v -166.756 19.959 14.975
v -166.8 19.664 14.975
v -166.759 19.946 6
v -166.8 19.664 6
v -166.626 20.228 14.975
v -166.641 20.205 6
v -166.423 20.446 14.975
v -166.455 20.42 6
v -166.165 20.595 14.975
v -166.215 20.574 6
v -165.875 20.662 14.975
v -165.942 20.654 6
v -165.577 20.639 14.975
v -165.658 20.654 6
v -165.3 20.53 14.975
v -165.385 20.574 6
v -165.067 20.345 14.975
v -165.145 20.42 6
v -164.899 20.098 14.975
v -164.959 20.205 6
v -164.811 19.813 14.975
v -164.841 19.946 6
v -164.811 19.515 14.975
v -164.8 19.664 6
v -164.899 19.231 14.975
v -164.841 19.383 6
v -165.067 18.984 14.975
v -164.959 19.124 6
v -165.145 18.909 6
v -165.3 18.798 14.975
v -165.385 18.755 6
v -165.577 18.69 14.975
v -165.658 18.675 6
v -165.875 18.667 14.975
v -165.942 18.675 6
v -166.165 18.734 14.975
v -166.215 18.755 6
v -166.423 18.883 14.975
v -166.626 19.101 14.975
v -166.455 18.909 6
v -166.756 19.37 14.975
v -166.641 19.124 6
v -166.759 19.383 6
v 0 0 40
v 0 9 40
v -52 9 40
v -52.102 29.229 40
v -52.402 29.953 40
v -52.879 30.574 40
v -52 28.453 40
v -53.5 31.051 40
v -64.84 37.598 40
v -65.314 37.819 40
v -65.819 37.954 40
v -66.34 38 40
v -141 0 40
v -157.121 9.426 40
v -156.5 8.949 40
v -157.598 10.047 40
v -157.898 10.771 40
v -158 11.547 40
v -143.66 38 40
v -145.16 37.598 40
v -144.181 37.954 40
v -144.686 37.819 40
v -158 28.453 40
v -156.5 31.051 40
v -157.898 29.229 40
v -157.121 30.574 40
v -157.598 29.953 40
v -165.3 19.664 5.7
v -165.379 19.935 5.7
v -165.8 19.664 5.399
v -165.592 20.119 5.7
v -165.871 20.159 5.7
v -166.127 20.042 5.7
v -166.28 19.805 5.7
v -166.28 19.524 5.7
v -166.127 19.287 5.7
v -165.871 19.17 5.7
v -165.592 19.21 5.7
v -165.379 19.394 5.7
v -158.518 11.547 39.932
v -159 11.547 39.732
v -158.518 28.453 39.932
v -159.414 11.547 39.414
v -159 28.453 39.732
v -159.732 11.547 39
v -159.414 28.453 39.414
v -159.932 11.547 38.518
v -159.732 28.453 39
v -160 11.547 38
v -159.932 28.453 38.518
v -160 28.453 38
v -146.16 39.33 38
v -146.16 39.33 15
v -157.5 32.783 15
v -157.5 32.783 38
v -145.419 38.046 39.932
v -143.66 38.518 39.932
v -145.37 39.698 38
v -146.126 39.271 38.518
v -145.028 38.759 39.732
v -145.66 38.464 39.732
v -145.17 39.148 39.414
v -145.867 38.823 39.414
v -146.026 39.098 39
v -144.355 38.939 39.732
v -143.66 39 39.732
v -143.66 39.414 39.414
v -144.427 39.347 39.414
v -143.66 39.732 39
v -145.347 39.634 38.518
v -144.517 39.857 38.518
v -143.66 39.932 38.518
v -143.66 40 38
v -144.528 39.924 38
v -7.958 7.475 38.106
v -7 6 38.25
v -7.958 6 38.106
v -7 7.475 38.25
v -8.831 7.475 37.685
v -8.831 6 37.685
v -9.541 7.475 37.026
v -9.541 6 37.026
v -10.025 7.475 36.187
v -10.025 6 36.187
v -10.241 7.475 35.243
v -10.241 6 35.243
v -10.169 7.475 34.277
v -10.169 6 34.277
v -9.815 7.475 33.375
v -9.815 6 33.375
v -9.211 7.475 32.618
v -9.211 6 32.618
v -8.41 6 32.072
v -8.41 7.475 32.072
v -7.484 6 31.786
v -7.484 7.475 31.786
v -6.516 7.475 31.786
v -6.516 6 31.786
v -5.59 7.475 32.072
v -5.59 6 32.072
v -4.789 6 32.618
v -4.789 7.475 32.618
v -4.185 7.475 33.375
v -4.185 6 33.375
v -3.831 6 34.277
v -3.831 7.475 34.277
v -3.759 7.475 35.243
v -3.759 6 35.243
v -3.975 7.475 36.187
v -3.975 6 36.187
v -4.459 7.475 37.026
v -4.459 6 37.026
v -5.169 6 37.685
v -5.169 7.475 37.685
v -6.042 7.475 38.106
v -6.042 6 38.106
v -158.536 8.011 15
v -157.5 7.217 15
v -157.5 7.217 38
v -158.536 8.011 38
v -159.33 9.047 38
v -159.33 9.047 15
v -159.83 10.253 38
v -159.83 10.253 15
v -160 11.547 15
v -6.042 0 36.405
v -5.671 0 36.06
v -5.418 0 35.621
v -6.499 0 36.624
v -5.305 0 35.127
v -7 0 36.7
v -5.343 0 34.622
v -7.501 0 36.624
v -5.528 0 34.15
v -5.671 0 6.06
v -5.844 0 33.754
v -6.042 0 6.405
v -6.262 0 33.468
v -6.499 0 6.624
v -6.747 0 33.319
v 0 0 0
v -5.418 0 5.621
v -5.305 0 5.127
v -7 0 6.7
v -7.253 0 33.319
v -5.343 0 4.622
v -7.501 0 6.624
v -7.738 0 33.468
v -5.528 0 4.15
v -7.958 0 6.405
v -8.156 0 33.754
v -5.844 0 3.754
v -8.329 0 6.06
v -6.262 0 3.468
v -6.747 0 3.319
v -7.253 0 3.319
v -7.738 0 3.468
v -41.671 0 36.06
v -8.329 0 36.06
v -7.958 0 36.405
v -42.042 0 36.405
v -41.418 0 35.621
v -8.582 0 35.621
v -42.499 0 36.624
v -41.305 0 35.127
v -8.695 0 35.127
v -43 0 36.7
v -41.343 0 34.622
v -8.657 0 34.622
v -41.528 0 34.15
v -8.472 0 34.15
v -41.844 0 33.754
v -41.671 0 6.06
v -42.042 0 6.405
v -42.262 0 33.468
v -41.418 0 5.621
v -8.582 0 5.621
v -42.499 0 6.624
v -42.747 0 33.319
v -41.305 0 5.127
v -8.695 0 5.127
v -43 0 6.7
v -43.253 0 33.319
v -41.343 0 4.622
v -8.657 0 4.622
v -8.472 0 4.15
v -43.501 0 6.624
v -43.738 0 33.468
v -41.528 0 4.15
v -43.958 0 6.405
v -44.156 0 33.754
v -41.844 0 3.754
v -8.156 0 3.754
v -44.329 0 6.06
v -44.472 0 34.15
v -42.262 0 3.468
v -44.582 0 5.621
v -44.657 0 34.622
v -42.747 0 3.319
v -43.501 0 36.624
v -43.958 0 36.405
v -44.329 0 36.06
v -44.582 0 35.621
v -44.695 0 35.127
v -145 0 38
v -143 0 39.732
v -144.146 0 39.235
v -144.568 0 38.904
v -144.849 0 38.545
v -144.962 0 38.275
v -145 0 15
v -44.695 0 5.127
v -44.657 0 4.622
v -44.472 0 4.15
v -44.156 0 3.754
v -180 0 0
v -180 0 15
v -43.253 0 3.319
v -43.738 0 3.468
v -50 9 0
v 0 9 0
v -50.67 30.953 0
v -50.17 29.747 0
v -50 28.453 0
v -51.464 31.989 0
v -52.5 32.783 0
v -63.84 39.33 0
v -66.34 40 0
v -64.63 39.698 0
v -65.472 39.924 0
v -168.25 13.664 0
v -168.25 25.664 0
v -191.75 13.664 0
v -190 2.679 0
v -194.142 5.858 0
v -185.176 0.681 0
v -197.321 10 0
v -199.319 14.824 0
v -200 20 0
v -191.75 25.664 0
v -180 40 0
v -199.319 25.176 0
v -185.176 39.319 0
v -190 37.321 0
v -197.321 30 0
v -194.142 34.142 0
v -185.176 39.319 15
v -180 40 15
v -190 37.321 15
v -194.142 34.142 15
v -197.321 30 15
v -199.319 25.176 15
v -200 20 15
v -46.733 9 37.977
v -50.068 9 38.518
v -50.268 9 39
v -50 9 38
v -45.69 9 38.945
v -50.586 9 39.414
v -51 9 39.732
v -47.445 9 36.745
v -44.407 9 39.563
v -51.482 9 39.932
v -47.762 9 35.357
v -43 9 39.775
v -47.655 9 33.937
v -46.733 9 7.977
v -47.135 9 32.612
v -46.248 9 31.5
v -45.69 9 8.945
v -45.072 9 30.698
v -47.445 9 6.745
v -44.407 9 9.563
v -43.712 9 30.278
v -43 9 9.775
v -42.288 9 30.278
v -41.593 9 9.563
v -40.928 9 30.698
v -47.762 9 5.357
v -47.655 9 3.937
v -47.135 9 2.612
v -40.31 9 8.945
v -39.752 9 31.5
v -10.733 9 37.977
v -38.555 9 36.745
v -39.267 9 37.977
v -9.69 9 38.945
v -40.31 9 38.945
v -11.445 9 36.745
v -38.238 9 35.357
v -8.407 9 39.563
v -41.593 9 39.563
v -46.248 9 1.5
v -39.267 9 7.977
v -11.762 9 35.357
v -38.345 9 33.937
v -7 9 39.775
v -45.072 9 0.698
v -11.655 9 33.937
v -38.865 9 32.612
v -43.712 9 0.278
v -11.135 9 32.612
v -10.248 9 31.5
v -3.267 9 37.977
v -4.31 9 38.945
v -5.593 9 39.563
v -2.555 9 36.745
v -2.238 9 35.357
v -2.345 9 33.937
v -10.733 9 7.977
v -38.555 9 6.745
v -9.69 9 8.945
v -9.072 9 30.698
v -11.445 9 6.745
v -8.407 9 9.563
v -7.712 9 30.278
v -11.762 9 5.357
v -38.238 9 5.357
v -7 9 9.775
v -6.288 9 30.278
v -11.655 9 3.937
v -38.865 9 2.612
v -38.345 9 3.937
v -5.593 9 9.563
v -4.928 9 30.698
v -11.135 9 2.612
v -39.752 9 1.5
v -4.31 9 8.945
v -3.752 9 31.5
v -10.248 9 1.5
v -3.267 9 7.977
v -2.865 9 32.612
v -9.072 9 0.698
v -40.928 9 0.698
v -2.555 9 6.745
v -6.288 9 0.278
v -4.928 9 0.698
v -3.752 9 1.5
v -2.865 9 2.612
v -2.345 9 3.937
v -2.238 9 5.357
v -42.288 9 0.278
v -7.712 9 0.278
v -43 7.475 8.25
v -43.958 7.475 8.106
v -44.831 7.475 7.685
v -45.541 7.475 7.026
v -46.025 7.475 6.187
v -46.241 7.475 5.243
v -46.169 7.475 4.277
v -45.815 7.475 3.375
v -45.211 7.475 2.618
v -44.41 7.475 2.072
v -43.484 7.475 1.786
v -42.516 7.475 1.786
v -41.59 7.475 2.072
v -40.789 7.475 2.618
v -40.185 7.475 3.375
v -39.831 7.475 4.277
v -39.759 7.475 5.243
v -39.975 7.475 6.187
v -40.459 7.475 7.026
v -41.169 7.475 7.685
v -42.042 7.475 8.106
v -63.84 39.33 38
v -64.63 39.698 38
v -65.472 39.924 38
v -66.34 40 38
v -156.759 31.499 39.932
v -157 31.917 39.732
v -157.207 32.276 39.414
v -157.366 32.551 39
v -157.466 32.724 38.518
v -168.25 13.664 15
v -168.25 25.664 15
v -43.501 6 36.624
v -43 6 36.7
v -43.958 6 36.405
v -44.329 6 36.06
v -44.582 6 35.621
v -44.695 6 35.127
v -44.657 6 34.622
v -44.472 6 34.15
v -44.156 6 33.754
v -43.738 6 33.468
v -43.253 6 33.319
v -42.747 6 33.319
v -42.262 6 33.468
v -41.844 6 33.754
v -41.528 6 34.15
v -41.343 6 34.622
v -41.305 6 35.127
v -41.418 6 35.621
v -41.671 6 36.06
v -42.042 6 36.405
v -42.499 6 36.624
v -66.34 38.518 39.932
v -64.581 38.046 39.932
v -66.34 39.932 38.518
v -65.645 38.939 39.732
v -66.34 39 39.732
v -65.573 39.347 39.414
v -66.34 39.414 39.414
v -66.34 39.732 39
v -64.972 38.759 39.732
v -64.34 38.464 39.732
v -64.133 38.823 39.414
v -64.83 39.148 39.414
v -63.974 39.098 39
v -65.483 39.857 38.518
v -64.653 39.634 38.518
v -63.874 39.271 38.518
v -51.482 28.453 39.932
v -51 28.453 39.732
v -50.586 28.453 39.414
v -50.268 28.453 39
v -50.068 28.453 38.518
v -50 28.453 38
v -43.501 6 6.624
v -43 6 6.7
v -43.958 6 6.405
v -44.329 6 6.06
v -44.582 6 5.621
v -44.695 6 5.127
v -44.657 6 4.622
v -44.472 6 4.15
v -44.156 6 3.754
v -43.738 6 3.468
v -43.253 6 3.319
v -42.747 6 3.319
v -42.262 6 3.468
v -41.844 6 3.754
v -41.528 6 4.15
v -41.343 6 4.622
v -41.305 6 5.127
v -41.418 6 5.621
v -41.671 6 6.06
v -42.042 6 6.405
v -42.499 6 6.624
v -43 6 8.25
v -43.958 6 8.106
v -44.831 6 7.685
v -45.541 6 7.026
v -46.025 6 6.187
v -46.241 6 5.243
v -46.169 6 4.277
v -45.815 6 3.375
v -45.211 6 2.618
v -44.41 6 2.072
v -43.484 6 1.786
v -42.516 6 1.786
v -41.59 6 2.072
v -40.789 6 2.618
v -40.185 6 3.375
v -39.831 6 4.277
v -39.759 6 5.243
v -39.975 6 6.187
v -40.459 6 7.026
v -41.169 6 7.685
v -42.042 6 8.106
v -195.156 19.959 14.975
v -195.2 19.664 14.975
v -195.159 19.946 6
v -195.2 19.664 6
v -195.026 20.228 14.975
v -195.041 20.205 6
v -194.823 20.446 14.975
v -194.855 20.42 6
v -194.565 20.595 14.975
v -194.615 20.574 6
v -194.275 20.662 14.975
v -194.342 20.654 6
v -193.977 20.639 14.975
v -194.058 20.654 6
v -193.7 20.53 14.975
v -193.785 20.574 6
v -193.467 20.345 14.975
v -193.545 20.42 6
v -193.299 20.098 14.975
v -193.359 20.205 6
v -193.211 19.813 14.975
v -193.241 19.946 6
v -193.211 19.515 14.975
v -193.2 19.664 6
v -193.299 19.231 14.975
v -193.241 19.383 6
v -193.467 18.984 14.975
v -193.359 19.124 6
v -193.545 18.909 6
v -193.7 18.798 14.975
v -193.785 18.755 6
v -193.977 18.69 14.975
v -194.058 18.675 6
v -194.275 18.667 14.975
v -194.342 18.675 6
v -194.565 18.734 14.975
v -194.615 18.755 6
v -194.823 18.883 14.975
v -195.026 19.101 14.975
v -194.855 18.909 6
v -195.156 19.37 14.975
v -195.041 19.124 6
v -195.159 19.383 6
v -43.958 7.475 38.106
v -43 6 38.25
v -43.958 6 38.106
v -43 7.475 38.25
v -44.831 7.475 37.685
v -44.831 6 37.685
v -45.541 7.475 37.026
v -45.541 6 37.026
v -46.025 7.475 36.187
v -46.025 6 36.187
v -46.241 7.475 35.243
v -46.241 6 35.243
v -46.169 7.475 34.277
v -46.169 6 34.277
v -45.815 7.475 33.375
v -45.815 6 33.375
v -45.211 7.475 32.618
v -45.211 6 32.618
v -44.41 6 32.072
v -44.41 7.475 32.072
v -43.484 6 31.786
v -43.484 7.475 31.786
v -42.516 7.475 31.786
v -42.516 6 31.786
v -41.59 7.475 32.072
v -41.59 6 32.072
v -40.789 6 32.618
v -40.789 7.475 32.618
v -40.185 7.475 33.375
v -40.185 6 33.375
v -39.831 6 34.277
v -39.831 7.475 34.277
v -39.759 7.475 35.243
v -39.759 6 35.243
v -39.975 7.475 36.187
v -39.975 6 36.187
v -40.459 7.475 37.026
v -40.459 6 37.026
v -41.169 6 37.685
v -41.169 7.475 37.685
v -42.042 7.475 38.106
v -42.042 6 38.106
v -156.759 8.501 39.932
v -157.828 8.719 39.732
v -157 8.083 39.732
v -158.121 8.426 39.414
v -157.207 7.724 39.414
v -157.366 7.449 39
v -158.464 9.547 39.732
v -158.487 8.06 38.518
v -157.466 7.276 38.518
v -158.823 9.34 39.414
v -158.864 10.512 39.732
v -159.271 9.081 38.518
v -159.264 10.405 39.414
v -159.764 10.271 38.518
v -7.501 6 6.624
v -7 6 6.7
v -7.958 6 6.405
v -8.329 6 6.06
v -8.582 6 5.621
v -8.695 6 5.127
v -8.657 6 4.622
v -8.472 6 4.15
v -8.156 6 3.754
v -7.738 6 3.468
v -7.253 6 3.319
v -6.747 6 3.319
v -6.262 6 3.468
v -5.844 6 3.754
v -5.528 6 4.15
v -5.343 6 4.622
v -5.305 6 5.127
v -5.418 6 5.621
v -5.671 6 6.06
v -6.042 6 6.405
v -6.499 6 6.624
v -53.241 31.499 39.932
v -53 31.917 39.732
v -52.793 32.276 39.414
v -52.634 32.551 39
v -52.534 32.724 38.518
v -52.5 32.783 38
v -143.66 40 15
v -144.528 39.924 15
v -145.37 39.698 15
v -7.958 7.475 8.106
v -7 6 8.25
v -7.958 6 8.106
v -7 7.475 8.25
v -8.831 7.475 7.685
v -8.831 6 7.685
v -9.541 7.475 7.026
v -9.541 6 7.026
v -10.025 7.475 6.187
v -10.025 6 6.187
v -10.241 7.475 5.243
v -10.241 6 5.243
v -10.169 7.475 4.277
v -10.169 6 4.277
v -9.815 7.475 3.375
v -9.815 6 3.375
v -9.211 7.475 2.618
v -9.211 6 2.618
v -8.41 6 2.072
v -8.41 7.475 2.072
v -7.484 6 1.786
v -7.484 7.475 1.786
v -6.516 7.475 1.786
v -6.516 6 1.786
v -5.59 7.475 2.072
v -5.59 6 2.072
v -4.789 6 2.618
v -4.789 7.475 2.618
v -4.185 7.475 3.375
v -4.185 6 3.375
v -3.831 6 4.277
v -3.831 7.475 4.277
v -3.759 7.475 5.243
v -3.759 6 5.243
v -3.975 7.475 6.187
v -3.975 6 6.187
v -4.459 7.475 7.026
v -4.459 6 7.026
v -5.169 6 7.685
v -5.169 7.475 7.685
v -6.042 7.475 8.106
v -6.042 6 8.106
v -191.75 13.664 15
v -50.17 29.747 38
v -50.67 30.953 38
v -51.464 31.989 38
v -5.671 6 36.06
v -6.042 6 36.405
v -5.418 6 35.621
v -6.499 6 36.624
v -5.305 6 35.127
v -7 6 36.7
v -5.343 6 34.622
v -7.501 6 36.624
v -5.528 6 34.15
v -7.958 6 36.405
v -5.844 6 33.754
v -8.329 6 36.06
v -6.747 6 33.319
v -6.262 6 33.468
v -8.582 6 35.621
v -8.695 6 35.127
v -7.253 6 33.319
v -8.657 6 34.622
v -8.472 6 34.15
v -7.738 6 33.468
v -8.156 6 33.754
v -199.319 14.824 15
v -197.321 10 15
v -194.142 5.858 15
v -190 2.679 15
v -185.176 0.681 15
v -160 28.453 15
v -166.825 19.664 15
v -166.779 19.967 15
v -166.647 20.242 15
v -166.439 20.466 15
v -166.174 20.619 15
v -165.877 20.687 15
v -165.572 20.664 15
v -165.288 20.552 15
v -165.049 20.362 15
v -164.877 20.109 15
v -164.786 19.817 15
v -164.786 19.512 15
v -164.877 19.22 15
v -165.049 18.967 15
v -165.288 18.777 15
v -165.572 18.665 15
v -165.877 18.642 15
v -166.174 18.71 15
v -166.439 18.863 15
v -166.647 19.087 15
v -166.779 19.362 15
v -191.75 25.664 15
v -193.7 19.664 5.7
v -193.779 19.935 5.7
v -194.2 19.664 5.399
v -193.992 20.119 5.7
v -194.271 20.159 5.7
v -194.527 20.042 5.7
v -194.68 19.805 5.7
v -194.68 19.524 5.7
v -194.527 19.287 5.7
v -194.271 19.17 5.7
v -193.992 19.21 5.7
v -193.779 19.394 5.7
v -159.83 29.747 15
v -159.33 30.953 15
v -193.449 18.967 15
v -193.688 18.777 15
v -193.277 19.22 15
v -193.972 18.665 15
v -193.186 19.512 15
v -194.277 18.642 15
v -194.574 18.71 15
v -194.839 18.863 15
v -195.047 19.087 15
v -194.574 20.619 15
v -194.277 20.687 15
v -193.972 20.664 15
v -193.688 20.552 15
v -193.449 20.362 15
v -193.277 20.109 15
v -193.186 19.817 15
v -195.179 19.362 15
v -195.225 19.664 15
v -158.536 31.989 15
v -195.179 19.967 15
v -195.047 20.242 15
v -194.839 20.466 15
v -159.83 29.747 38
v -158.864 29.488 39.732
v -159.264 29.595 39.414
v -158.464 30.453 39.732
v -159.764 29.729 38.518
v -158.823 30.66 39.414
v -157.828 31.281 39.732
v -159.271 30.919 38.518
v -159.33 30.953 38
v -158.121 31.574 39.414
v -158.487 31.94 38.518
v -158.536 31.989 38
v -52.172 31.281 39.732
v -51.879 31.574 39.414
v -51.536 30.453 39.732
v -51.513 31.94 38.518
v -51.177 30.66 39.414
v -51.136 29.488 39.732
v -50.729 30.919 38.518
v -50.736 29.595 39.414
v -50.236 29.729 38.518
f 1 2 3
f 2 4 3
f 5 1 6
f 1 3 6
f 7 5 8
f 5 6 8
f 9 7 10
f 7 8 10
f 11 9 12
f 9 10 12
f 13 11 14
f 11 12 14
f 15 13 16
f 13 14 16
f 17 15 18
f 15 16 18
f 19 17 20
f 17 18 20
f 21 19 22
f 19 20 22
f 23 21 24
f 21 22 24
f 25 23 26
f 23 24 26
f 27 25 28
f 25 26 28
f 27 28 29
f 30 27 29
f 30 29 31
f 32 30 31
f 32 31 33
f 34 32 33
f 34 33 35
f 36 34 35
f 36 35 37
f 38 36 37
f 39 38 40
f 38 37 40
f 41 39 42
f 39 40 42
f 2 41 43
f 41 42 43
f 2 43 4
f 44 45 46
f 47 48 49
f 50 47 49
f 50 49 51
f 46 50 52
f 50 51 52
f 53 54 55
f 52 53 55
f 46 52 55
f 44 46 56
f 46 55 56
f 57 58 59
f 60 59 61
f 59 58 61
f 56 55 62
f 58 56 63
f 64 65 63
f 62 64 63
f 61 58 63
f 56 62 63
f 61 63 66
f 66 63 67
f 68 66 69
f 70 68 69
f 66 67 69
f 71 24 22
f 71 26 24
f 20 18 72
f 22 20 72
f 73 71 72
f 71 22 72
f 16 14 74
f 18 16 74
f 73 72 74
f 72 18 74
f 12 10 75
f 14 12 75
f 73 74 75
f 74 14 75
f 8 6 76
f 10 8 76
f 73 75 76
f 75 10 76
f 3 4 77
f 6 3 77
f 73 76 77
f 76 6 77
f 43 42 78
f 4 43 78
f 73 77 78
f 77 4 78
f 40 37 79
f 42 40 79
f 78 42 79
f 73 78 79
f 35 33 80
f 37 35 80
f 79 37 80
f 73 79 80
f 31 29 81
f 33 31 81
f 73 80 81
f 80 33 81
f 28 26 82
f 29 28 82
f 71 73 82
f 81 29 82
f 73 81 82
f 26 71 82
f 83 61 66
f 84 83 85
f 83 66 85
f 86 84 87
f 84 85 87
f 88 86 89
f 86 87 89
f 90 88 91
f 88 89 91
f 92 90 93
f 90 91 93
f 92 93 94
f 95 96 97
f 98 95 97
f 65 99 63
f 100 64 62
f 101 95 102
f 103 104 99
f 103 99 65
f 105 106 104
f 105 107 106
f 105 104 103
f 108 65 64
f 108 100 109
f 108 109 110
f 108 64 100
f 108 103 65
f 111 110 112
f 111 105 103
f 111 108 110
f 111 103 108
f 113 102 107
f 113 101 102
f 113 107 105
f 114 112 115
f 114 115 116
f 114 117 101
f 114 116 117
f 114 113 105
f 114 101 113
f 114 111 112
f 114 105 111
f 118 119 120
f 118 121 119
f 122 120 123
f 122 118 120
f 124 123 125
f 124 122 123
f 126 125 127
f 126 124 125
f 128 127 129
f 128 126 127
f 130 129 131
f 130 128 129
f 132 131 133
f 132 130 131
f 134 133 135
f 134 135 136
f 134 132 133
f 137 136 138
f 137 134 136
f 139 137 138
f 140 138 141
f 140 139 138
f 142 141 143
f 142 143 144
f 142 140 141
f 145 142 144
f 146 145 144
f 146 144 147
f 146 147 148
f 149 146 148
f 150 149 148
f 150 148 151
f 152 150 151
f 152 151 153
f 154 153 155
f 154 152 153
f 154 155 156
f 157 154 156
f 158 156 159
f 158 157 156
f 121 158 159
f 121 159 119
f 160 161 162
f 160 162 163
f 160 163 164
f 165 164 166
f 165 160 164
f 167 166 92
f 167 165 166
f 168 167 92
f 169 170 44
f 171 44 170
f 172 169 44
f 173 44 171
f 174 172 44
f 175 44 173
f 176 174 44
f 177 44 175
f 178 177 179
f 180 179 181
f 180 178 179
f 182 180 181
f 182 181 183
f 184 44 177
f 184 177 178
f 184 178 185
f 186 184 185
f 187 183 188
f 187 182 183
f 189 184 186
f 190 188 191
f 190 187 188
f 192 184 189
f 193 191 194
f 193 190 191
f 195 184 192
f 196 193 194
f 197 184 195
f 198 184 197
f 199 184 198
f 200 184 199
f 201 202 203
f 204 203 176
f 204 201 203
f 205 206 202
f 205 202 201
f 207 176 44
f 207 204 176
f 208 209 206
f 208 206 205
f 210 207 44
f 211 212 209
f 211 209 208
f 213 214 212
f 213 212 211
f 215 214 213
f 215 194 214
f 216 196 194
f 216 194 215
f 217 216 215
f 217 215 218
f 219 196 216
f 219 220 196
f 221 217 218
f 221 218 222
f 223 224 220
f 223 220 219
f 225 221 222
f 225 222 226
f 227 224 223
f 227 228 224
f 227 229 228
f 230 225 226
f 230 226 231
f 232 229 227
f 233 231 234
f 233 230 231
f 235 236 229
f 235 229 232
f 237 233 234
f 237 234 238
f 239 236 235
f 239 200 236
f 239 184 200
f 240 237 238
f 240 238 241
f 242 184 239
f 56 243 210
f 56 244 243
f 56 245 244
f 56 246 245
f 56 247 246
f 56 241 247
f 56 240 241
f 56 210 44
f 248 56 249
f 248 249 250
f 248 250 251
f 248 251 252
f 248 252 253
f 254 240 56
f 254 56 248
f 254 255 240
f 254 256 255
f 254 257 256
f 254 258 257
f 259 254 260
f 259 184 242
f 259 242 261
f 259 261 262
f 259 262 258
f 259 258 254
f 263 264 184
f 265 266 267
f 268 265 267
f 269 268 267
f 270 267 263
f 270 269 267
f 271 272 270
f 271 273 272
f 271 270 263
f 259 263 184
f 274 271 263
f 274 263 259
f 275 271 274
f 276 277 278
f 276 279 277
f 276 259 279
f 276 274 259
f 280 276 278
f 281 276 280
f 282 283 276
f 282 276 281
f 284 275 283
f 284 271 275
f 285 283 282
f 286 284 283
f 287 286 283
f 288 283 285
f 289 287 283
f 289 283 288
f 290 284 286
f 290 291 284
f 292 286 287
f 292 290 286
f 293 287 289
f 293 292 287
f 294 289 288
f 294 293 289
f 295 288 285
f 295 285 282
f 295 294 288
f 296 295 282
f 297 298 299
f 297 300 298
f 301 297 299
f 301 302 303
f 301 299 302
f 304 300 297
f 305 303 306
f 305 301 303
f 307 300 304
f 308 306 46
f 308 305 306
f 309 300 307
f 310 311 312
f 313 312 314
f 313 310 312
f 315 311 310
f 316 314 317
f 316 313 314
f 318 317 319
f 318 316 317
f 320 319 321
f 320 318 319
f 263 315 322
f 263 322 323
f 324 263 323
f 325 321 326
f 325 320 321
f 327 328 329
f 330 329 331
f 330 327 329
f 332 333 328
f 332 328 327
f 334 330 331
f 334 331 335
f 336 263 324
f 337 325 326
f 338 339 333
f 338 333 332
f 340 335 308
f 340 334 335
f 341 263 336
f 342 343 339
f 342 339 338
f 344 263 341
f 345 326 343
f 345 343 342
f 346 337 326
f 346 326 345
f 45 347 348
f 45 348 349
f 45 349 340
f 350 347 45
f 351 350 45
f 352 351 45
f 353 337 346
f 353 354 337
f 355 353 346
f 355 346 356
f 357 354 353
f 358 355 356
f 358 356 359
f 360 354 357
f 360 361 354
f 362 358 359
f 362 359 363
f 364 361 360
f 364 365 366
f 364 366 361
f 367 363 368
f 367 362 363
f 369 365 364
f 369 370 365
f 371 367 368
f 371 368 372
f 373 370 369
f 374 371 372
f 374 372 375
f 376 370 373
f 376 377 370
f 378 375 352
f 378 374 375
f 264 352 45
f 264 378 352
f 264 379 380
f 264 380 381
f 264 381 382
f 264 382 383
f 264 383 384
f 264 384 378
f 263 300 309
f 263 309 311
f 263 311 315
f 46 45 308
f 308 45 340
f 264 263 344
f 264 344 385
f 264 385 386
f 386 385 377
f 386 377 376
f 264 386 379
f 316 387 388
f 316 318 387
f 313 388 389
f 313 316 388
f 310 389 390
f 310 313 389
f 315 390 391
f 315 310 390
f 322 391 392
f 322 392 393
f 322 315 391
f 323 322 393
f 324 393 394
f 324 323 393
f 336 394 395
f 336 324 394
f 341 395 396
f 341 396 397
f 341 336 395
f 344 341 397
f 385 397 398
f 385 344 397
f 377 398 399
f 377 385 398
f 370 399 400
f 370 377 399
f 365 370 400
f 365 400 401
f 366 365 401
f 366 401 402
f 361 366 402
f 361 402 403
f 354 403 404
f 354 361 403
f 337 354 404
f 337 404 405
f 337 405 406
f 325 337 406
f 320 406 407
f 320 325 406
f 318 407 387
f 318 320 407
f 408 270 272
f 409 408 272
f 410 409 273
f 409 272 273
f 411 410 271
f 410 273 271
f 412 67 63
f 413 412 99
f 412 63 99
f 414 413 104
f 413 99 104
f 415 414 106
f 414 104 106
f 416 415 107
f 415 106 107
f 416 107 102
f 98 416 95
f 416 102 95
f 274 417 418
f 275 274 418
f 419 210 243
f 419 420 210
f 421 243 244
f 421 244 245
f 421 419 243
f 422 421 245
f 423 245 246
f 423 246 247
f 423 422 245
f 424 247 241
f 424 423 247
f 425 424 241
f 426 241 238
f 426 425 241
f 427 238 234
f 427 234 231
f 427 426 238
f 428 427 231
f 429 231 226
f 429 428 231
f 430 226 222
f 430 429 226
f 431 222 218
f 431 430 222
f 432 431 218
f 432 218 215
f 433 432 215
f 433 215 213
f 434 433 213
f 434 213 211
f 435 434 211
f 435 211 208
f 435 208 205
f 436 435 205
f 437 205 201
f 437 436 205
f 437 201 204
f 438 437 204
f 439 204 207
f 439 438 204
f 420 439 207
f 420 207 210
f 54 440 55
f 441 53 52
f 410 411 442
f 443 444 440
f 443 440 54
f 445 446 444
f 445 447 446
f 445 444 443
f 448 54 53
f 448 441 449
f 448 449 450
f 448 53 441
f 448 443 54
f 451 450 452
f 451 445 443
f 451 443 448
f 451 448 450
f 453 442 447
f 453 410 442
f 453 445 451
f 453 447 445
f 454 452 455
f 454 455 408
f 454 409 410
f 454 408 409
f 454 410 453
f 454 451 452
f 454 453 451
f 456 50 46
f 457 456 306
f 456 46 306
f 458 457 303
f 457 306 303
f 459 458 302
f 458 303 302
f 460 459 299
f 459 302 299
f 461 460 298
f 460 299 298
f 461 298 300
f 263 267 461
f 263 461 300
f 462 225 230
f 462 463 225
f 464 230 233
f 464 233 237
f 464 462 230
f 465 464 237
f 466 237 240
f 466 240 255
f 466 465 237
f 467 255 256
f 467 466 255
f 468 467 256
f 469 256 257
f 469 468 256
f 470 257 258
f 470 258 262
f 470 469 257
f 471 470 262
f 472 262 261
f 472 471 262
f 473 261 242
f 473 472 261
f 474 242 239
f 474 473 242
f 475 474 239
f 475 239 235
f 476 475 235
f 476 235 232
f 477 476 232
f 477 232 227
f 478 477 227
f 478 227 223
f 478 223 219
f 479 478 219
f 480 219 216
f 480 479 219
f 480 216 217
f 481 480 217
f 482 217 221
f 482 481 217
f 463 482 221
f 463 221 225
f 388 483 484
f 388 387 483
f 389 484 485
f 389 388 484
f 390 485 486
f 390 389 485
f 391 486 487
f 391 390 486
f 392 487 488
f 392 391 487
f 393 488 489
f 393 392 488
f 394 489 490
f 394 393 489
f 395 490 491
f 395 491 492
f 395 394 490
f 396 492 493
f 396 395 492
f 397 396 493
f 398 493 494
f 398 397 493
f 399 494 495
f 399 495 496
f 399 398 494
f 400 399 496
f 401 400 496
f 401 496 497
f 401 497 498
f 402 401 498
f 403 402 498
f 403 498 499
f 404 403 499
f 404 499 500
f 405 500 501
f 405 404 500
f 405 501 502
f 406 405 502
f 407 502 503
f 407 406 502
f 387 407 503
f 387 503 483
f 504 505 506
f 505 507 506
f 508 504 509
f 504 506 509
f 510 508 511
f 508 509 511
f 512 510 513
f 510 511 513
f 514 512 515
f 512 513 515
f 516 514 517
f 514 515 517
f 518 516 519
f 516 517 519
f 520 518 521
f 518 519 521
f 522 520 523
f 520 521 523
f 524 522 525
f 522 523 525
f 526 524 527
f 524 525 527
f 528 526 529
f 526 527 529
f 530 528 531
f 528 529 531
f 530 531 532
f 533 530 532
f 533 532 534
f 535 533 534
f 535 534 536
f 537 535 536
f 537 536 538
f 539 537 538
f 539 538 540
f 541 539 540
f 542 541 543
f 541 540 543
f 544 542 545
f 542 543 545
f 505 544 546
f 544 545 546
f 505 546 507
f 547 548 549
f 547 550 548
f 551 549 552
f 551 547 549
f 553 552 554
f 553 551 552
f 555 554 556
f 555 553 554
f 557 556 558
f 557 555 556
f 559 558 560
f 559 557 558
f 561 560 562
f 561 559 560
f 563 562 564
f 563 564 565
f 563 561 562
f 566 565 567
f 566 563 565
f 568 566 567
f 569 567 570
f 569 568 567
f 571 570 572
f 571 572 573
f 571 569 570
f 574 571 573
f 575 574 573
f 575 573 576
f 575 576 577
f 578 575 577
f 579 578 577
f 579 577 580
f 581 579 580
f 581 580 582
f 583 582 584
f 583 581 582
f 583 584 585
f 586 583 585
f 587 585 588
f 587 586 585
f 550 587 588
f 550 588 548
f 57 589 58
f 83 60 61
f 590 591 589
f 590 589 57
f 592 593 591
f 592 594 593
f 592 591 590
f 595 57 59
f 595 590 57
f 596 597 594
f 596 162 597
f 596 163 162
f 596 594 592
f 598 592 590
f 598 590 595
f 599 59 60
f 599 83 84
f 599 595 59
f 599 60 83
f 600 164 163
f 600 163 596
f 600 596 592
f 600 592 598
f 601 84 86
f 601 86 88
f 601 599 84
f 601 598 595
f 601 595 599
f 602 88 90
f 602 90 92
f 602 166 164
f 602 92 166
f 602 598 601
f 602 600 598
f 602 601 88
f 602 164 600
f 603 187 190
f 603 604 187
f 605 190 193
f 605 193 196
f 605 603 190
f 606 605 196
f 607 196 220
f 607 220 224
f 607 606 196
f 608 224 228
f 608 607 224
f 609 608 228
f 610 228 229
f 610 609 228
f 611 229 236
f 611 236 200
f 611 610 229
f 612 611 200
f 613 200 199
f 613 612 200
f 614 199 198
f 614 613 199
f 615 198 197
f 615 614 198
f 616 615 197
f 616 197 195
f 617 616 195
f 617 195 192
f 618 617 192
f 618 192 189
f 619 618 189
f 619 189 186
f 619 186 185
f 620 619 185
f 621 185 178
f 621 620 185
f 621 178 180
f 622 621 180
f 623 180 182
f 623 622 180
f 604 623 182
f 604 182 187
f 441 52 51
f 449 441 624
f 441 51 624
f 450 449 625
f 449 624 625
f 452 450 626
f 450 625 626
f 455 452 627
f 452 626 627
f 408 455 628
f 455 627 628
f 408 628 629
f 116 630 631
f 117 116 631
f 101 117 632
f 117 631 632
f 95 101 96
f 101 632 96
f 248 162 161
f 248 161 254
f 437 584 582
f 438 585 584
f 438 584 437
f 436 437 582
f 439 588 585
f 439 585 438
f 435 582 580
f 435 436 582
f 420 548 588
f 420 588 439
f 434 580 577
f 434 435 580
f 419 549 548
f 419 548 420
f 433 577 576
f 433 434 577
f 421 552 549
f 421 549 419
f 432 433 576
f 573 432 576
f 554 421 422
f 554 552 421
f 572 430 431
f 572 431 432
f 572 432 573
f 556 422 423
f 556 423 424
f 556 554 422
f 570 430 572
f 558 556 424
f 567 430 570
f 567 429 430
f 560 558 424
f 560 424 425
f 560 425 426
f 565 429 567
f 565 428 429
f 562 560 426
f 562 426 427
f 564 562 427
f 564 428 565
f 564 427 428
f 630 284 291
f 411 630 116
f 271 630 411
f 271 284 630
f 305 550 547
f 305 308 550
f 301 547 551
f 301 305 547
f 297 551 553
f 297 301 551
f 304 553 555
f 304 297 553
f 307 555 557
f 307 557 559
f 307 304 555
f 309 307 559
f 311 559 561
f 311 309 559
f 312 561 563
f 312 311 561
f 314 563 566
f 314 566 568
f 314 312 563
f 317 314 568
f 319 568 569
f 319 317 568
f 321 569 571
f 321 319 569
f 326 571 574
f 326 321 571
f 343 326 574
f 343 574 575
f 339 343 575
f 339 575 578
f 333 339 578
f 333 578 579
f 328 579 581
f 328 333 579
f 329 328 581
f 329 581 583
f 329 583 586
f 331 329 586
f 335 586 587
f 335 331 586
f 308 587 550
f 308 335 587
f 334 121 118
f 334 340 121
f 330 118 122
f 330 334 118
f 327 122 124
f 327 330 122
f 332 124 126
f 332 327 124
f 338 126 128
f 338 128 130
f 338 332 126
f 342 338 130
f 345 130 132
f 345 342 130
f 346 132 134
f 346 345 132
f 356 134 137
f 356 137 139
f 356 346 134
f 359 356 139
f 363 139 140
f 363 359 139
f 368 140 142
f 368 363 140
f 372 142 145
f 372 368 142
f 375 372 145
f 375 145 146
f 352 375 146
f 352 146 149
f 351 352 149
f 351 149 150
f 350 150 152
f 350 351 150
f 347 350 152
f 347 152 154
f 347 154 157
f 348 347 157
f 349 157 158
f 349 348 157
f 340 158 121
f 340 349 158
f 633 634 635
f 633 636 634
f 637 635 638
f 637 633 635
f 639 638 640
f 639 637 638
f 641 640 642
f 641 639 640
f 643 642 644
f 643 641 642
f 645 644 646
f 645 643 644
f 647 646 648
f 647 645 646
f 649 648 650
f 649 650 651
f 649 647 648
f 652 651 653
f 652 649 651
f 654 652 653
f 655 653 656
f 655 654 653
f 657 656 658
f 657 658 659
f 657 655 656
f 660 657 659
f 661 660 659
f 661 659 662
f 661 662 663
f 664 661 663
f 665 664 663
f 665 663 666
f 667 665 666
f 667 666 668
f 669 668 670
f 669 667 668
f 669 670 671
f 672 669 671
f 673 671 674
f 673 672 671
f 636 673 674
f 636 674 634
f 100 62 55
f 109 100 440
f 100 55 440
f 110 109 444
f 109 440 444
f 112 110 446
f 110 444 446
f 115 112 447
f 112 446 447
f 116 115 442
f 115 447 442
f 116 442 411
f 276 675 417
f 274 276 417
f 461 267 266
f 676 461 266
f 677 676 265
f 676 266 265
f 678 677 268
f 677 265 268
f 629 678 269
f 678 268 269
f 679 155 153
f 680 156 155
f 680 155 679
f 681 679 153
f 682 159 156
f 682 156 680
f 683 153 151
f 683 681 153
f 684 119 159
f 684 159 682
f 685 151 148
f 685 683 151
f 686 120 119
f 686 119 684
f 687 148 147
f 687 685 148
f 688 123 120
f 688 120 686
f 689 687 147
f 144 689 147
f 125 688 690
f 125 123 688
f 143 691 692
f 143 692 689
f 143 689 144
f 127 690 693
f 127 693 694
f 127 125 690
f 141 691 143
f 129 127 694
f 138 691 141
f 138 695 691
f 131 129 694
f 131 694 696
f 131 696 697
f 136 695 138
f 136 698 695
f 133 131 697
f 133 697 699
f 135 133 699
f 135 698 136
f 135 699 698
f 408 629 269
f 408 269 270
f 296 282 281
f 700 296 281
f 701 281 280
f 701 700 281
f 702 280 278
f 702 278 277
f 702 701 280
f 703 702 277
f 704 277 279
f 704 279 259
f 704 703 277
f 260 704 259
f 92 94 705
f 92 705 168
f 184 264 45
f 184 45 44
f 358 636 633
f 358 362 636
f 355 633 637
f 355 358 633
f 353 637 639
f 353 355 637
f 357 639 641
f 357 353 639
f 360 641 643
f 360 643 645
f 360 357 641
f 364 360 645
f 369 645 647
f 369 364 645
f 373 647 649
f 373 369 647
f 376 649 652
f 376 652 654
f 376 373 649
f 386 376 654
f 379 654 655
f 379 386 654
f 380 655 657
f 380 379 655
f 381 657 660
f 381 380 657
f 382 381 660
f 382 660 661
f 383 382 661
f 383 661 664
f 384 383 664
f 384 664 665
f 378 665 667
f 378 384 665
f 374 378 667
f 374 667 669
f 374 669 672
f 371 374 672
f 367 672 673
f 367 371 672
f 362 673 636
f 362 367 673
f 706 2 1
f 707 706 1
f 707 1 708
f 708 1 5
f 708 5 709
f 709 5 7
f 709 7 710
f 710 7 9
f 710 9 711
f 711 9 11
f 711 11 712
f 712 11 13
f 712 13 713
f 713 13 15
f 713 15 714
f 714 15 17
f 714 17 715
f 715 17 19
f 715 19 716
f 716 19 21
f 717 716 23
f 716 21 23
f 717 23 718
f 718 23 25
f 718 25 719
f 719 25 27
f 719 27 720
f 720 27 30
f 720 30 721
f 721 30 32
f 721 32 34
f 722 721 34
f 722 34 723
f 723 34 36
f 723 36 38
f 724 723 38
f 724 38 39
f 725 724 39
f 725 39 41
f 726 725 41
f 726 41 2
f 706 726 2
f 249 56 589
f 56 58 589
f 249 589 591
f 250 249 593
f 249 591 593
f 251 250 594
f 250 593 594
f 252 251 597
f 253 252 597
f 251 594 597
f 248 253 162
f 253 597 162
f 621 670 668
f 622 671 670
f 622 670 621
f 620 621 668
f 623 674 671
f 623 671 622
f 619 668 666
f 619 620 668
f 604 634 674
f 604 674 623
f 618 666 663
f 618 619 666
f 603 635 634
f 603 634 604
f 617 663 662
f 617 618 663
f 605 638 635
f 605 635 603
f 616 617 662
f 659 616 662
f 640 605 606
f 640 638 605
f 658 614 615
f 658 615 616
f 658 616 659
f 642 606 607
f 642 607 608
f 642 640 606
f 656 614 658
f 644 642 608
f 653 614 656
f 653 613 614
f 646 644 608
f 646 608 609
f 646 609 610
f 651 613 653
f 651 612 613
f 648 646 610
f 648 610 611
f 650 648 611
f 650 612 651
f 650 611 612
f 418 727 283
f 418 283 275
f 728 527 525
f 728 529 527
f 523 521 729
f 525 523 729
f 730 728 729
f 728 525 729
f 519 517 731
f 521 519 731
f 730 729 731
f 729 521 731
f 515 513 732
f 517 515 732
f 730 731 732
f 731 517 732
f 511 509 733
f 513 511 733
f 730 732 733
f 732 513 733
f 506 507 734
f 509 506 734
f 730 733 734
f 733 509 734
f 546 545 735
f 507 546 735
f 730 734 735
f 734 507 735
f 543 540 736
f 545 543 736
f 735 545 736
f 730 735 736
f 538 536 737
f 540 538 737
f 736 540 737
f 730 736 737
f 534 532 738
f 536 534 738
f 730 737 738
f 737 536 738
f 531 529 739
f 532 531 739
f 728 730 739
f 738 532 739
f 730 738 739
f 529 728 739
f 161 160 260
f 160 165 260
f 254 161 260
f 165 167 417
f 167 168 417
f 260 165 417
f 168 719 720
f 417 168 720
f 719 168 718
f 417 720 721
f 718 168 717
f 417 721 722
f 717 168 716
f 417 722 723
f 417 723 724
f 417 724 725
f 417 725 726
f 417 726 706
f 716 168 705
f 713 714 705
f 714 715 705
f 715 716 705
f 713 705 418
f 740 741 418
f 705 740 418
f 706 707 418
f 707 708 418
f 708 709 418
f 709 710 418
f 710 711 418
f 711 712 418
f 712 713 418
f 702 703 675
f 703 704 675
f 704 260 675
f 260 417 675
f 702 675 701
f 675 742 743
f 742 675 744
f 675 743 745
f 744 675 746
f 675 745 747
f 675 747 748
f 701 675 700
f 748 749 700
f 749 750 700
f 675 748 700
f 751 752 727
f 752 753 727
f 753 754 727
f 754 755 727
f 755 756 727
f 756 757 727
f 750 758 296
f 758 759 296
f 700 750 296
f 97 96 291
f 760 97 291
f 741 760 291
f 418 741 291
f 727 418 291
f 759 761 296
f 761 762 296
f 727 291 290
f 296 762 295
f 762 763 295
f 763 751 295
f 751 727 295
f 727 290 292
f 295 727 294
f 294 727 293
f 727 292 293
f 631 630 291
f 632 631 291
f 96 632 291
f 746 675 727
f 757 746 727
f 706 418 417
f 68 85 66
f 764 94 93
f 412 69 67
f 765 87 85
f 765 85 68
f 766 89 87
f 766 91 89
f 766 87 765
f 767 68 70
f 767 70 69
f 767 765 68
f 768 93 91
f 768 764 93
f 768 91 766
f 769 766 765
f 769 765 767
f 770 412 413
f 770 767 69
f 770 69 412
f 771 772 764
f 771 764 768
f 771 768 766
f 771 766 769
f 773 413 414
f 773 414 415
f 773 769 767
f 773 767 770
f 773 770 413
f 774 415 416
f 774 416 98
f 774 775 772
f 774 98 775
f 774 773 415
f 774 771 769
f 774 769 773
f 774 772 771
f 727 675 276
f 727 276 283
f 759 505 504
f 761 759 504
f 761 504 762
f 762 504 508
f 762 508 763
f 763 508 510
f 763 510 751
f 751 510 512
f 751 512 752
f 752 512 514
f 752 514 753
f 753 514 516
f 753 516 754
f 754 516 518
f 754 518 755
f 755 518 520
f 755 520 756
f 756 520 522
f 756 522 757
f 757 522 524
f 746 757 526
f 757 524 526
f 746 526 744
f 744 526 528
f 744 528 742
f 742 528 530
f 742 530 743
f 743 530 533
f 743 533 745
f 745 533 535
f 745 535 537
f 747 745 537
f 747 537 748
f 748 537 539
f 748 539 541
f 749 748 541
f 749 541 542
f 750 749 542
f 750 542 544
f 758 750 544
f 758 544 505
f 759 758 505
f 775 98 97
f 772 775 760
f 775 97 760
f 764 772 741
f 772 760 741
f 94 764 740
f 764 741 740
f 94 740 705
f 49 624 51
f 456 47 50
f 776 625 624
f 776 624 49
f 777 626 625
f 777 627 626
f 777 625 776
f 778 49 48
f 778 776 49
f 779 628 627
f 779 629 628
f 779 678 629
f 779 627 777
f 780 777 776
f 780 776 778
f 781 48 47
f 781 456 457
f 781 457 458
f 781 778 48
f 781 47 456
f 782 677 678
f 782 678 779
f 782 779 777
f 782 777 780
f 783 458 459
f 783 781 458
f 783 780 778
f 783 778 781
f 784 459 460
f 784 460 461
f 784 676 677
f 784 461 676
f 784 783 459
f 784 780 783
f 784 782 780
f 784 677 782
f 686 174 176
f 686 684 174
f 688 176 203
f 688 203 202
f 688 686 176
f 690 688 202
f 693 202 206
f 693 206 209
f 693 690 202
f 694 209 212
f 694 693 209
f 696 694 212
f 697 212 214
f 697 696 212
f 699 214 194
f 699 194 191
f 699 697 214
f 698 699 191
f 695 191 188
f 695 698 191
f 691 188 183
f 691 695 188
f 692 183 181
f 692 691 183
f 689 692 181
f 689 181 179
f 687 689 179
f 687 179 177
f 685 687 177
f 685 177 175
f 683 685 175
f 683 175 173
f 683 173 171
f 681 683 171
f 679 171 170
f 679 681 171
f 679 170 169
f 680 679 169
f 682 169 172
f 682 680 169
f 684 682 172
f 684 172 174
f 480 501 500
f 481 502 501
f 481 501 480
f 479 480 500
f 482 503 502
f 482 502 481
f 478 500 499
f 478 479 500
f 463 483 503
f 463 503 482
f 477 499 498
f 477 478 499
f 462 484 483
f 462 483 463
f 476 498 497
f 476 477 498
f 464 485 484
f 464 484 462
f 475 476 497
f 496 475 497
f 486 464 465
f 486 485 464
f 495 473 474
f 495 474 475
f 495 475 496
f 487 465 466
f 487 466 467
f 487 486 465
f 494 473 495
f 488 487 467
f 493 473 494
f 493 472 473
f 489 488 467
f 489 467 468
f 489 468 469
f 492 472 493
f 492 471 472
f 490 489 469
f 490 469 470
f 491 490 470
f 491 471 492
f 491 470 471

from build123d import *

# Parameters (mm, degrees)
BOSS_EXTRUDE1_DEPTH                        = 40
CUT_EXTRUDE2_DEPTH                         = 25
CUT_EXTRUDE4_DEPTH                         = 208.846096908
F_2_0MM_DOWEL_HOLE1_D                      = 2
F_2_0MM_DOWEL_HOLE1_DEPTH                  = 9
F_2_0MM_DOWEL_HOLE1_CSINK_D                = 2.05
F_2_0MM_DOWEL_HOLE1_CSINK_ANGLE            = 90
F_2_0MM_DOWEL_HOLE1_TIP                    = 0.600860619
SKETCH11_W                                 = 23.5
SKETCH11_H                                 = 12
CUT_EXTRUDE3_DEPTH                         = 206.48722588
FILLET7_R                                  = 5
FILLET6_R                                  = 2
CBORE_FOR_M5_CHEESE_HEAD_SCREW1_AT_2_COUNT = 2
CBORE_FOR_M5_CHEESE_HEAD_SCREW1_AT_2_PITCH = 36
CBORE_FOR_M5_CHEESE_HEAD_SCREW1_AT_3_COUNT = 2
CBORE_FOR_M5_CHEESE_HEAD_SCREW1_AT_3_PITCH = 30
CBORE_FOR_M5_CHEESE_HEAD_SCREW1_AT_4_COUNT = 2
CBORE_FOR_M5_CHEESE_HEAD_SCREW1_AT_4_PITCH = 46.861498055
FILLET8_R                                  = 20


with BuildPart() as part:
    # Sketch1 → Boss-Extrude1 (new body)
    with BuildSketch(Plane.XY):
        Polygon((0, 0), (-200, 0), (-200, 40), (-50, 40), (-50, 9), (0, 9), align=None)
    extrude(amount=BOSS_EXTRUDE1_DEPTH)

    # Sketch5 → Cut-Extrude2 (cut)
    with BuildSketch(Plane.XY.offset(40)):
        Polygon((-145, 40), (-160, 31.339745962), (-160, 8.660254038), (-145, 0), (-200, 0), (-200, 40), align=None)
    extrude(amount=-CUT_EXTRUDE2_DEPTH, mode=Mode.SUBTRACT)

    # Sketch13 → Cut-Extrude4 (cut, through all)
    with BuildSketch(Plane.XY.offset(40)):
        Polygon((-50, 31.339745962), (-65, 40), (-50, 40), align=None)
    extrude(amount=-CUT_EXTRUDE4_DEPTH, mode=Mode.SUBTRACT)

    # Ø2.0mm Dowel Hole1
    with Locations(Plane.XY.offset(15)):
        with Locations((-194.2, 19.664446974), (-165.8, 19.664446974)):
            CounterSinkHole(F_2_0MM_DOWEL_HOLE1_D / 2, F_2_0MM_DOWEL_HOLE1_CSINK_D / 2, depth=F_2_0MM_DOWEL_HOLE1_DEPTH, counter_sink_angle=F_2_0MM_DOWEL_HOLE1_CSINK_ANGLE)
            with Locations((0, 0, -(F_2_0MM_DOWEL_HOLE1_DEPTH + F_2_0MM_DOWEL_HOLE1_TIP / 2))):  # 118° drill point
                Cone(0, F_2_0MM_DOWEL_HOLE1_D / 2, F_2_0MM_DOWEL_HOLE1_TIP, mode=Mode.SUBTRACT)

    # Sketch11 → Cut-Extrude3 (cut, through all)
    with BuildSketch(Plane.XY.offset(15)):
        with Locations((-180, 19.664446974)):
            Rectangle(SKETCH11_W, SKETCH11_H)
    extrude(amount=-CUT_EXTRUDE3_DEPTH, mode=Mode.SUBTRACT)

    # Fillet7
    fillet7_edges = [part.edges().sort_by_distance(p)[0] for p in [
        (-145, 40, 27.5),
        (-160, 31.339745962, 27.5),
        (-160, 8.660254038, 27.5),
        (-50, 31.339745962, 20),
        (-65, 40, 20),
    ]]
    fillet(fillet7_edges, radius=FILLET7_R)

    # Fillet6
    fillet6_edges = [part.edges().sort_by_distance(p)[0] for p in [
        (-50, 18.726497308, 40),
        (-151.25, 3.608439182, 40),
        (-58.169872981, 36.056624327, 40),
        (-105, 40, 40),
        (-151.830127019, 36.056624327, 40),
        (-160, 20, 40),
        (-159.330127019, 30.952994616, 40),
        (-159.330127019, 9.047005384, 40),
        (-144.954349263, 39.829629131, 40),
        (-50.669872981, 30.952994616, 40),
        (-65.045650737, 39.829629131, 40),
    ]]
    fillet(fillet6_edges, radius=FILLET6_R)

    # Sketch3 → CBORE for M5 Cheese Head Screw1 (revolve, cut)
    with BuildSketch(Plane(origin=(-43, 9, 5), x_dir=(0, 0, 1), z_dir=(1, 0, 0))):
        Polygon((0, 0), (0, 9), (1.7, 9), (1.7, 3), (3.25, 3), (3.25, 1.525), (4.775, 0), align=None)
    cbore_for_m5_cheese_head_screw1 = revolve(axis=Axis((-43, 15.35, 5), (0, -1, 0)), mode=Mode.SUBTRACT)

    # CBORE for M5 Cheese Head Screw1 at 2: CBORE for M5 Cheese Head Screw1 ×2
    with Locations(*[(i * CBORE_FOR_M5_CHEESE_HEAD_SCREW1_AT_2_PITCH, 0, 0) for i in range(1, CBORE_FOR_M5_CHEESE_HEAD_SCREW1_AT_2_COUNT)]):
        add(cbore_for_m5_cheese_head_screw1, mode=Mode.SUBTRACT)

    # CBORE for M5 Cheese Head Screw1 at 3: CBORE for M5 Cheese Head Screw1 ×2
    with Locations(*[(0, 0, i * CBORE_FOR_M5_CHEESE_HEAD_SCREW1_AT_3_PITCH) for i in range(1, CBORE_FOR_M5_CHEESE_HEAD_SCREW1_AT_3_COUNT)]):
        add(cbore_for_m5_cheese_head_screw1, mode=Mode.SUBTRACT)

    # CBORE for M5 Cheese Head Screw1 at 4: CBORE for M5 Cheese Head Screw1 ×2
    with Locations(*[Vector(0.7682212795973759, 0, 0.6401843996644799) * (i * CBORE_FOR_M5_CHEESE_HEAD_SCREW1_AT_4_PITCH) for i in range(1, CBORE_FOR_M5_CHEESE_HEAD_SCREW1_AT_4_COUNT)]):
        add(cbore_for_m5_cheese_head_screw1, mode=Mode.SUBTRACT)

    # Fillet8
    fillet8_edges = [part.edges().sort_by_distance(p)[0] for p in [
        (-200, 0, 7.5),
        (-200, 40, 7.5),
    ]]
    fillet(fillet8_edges, radius=FILLET8_R - 0.0001)  # a hair under: the kernel refuses the full size


solid = part.part
